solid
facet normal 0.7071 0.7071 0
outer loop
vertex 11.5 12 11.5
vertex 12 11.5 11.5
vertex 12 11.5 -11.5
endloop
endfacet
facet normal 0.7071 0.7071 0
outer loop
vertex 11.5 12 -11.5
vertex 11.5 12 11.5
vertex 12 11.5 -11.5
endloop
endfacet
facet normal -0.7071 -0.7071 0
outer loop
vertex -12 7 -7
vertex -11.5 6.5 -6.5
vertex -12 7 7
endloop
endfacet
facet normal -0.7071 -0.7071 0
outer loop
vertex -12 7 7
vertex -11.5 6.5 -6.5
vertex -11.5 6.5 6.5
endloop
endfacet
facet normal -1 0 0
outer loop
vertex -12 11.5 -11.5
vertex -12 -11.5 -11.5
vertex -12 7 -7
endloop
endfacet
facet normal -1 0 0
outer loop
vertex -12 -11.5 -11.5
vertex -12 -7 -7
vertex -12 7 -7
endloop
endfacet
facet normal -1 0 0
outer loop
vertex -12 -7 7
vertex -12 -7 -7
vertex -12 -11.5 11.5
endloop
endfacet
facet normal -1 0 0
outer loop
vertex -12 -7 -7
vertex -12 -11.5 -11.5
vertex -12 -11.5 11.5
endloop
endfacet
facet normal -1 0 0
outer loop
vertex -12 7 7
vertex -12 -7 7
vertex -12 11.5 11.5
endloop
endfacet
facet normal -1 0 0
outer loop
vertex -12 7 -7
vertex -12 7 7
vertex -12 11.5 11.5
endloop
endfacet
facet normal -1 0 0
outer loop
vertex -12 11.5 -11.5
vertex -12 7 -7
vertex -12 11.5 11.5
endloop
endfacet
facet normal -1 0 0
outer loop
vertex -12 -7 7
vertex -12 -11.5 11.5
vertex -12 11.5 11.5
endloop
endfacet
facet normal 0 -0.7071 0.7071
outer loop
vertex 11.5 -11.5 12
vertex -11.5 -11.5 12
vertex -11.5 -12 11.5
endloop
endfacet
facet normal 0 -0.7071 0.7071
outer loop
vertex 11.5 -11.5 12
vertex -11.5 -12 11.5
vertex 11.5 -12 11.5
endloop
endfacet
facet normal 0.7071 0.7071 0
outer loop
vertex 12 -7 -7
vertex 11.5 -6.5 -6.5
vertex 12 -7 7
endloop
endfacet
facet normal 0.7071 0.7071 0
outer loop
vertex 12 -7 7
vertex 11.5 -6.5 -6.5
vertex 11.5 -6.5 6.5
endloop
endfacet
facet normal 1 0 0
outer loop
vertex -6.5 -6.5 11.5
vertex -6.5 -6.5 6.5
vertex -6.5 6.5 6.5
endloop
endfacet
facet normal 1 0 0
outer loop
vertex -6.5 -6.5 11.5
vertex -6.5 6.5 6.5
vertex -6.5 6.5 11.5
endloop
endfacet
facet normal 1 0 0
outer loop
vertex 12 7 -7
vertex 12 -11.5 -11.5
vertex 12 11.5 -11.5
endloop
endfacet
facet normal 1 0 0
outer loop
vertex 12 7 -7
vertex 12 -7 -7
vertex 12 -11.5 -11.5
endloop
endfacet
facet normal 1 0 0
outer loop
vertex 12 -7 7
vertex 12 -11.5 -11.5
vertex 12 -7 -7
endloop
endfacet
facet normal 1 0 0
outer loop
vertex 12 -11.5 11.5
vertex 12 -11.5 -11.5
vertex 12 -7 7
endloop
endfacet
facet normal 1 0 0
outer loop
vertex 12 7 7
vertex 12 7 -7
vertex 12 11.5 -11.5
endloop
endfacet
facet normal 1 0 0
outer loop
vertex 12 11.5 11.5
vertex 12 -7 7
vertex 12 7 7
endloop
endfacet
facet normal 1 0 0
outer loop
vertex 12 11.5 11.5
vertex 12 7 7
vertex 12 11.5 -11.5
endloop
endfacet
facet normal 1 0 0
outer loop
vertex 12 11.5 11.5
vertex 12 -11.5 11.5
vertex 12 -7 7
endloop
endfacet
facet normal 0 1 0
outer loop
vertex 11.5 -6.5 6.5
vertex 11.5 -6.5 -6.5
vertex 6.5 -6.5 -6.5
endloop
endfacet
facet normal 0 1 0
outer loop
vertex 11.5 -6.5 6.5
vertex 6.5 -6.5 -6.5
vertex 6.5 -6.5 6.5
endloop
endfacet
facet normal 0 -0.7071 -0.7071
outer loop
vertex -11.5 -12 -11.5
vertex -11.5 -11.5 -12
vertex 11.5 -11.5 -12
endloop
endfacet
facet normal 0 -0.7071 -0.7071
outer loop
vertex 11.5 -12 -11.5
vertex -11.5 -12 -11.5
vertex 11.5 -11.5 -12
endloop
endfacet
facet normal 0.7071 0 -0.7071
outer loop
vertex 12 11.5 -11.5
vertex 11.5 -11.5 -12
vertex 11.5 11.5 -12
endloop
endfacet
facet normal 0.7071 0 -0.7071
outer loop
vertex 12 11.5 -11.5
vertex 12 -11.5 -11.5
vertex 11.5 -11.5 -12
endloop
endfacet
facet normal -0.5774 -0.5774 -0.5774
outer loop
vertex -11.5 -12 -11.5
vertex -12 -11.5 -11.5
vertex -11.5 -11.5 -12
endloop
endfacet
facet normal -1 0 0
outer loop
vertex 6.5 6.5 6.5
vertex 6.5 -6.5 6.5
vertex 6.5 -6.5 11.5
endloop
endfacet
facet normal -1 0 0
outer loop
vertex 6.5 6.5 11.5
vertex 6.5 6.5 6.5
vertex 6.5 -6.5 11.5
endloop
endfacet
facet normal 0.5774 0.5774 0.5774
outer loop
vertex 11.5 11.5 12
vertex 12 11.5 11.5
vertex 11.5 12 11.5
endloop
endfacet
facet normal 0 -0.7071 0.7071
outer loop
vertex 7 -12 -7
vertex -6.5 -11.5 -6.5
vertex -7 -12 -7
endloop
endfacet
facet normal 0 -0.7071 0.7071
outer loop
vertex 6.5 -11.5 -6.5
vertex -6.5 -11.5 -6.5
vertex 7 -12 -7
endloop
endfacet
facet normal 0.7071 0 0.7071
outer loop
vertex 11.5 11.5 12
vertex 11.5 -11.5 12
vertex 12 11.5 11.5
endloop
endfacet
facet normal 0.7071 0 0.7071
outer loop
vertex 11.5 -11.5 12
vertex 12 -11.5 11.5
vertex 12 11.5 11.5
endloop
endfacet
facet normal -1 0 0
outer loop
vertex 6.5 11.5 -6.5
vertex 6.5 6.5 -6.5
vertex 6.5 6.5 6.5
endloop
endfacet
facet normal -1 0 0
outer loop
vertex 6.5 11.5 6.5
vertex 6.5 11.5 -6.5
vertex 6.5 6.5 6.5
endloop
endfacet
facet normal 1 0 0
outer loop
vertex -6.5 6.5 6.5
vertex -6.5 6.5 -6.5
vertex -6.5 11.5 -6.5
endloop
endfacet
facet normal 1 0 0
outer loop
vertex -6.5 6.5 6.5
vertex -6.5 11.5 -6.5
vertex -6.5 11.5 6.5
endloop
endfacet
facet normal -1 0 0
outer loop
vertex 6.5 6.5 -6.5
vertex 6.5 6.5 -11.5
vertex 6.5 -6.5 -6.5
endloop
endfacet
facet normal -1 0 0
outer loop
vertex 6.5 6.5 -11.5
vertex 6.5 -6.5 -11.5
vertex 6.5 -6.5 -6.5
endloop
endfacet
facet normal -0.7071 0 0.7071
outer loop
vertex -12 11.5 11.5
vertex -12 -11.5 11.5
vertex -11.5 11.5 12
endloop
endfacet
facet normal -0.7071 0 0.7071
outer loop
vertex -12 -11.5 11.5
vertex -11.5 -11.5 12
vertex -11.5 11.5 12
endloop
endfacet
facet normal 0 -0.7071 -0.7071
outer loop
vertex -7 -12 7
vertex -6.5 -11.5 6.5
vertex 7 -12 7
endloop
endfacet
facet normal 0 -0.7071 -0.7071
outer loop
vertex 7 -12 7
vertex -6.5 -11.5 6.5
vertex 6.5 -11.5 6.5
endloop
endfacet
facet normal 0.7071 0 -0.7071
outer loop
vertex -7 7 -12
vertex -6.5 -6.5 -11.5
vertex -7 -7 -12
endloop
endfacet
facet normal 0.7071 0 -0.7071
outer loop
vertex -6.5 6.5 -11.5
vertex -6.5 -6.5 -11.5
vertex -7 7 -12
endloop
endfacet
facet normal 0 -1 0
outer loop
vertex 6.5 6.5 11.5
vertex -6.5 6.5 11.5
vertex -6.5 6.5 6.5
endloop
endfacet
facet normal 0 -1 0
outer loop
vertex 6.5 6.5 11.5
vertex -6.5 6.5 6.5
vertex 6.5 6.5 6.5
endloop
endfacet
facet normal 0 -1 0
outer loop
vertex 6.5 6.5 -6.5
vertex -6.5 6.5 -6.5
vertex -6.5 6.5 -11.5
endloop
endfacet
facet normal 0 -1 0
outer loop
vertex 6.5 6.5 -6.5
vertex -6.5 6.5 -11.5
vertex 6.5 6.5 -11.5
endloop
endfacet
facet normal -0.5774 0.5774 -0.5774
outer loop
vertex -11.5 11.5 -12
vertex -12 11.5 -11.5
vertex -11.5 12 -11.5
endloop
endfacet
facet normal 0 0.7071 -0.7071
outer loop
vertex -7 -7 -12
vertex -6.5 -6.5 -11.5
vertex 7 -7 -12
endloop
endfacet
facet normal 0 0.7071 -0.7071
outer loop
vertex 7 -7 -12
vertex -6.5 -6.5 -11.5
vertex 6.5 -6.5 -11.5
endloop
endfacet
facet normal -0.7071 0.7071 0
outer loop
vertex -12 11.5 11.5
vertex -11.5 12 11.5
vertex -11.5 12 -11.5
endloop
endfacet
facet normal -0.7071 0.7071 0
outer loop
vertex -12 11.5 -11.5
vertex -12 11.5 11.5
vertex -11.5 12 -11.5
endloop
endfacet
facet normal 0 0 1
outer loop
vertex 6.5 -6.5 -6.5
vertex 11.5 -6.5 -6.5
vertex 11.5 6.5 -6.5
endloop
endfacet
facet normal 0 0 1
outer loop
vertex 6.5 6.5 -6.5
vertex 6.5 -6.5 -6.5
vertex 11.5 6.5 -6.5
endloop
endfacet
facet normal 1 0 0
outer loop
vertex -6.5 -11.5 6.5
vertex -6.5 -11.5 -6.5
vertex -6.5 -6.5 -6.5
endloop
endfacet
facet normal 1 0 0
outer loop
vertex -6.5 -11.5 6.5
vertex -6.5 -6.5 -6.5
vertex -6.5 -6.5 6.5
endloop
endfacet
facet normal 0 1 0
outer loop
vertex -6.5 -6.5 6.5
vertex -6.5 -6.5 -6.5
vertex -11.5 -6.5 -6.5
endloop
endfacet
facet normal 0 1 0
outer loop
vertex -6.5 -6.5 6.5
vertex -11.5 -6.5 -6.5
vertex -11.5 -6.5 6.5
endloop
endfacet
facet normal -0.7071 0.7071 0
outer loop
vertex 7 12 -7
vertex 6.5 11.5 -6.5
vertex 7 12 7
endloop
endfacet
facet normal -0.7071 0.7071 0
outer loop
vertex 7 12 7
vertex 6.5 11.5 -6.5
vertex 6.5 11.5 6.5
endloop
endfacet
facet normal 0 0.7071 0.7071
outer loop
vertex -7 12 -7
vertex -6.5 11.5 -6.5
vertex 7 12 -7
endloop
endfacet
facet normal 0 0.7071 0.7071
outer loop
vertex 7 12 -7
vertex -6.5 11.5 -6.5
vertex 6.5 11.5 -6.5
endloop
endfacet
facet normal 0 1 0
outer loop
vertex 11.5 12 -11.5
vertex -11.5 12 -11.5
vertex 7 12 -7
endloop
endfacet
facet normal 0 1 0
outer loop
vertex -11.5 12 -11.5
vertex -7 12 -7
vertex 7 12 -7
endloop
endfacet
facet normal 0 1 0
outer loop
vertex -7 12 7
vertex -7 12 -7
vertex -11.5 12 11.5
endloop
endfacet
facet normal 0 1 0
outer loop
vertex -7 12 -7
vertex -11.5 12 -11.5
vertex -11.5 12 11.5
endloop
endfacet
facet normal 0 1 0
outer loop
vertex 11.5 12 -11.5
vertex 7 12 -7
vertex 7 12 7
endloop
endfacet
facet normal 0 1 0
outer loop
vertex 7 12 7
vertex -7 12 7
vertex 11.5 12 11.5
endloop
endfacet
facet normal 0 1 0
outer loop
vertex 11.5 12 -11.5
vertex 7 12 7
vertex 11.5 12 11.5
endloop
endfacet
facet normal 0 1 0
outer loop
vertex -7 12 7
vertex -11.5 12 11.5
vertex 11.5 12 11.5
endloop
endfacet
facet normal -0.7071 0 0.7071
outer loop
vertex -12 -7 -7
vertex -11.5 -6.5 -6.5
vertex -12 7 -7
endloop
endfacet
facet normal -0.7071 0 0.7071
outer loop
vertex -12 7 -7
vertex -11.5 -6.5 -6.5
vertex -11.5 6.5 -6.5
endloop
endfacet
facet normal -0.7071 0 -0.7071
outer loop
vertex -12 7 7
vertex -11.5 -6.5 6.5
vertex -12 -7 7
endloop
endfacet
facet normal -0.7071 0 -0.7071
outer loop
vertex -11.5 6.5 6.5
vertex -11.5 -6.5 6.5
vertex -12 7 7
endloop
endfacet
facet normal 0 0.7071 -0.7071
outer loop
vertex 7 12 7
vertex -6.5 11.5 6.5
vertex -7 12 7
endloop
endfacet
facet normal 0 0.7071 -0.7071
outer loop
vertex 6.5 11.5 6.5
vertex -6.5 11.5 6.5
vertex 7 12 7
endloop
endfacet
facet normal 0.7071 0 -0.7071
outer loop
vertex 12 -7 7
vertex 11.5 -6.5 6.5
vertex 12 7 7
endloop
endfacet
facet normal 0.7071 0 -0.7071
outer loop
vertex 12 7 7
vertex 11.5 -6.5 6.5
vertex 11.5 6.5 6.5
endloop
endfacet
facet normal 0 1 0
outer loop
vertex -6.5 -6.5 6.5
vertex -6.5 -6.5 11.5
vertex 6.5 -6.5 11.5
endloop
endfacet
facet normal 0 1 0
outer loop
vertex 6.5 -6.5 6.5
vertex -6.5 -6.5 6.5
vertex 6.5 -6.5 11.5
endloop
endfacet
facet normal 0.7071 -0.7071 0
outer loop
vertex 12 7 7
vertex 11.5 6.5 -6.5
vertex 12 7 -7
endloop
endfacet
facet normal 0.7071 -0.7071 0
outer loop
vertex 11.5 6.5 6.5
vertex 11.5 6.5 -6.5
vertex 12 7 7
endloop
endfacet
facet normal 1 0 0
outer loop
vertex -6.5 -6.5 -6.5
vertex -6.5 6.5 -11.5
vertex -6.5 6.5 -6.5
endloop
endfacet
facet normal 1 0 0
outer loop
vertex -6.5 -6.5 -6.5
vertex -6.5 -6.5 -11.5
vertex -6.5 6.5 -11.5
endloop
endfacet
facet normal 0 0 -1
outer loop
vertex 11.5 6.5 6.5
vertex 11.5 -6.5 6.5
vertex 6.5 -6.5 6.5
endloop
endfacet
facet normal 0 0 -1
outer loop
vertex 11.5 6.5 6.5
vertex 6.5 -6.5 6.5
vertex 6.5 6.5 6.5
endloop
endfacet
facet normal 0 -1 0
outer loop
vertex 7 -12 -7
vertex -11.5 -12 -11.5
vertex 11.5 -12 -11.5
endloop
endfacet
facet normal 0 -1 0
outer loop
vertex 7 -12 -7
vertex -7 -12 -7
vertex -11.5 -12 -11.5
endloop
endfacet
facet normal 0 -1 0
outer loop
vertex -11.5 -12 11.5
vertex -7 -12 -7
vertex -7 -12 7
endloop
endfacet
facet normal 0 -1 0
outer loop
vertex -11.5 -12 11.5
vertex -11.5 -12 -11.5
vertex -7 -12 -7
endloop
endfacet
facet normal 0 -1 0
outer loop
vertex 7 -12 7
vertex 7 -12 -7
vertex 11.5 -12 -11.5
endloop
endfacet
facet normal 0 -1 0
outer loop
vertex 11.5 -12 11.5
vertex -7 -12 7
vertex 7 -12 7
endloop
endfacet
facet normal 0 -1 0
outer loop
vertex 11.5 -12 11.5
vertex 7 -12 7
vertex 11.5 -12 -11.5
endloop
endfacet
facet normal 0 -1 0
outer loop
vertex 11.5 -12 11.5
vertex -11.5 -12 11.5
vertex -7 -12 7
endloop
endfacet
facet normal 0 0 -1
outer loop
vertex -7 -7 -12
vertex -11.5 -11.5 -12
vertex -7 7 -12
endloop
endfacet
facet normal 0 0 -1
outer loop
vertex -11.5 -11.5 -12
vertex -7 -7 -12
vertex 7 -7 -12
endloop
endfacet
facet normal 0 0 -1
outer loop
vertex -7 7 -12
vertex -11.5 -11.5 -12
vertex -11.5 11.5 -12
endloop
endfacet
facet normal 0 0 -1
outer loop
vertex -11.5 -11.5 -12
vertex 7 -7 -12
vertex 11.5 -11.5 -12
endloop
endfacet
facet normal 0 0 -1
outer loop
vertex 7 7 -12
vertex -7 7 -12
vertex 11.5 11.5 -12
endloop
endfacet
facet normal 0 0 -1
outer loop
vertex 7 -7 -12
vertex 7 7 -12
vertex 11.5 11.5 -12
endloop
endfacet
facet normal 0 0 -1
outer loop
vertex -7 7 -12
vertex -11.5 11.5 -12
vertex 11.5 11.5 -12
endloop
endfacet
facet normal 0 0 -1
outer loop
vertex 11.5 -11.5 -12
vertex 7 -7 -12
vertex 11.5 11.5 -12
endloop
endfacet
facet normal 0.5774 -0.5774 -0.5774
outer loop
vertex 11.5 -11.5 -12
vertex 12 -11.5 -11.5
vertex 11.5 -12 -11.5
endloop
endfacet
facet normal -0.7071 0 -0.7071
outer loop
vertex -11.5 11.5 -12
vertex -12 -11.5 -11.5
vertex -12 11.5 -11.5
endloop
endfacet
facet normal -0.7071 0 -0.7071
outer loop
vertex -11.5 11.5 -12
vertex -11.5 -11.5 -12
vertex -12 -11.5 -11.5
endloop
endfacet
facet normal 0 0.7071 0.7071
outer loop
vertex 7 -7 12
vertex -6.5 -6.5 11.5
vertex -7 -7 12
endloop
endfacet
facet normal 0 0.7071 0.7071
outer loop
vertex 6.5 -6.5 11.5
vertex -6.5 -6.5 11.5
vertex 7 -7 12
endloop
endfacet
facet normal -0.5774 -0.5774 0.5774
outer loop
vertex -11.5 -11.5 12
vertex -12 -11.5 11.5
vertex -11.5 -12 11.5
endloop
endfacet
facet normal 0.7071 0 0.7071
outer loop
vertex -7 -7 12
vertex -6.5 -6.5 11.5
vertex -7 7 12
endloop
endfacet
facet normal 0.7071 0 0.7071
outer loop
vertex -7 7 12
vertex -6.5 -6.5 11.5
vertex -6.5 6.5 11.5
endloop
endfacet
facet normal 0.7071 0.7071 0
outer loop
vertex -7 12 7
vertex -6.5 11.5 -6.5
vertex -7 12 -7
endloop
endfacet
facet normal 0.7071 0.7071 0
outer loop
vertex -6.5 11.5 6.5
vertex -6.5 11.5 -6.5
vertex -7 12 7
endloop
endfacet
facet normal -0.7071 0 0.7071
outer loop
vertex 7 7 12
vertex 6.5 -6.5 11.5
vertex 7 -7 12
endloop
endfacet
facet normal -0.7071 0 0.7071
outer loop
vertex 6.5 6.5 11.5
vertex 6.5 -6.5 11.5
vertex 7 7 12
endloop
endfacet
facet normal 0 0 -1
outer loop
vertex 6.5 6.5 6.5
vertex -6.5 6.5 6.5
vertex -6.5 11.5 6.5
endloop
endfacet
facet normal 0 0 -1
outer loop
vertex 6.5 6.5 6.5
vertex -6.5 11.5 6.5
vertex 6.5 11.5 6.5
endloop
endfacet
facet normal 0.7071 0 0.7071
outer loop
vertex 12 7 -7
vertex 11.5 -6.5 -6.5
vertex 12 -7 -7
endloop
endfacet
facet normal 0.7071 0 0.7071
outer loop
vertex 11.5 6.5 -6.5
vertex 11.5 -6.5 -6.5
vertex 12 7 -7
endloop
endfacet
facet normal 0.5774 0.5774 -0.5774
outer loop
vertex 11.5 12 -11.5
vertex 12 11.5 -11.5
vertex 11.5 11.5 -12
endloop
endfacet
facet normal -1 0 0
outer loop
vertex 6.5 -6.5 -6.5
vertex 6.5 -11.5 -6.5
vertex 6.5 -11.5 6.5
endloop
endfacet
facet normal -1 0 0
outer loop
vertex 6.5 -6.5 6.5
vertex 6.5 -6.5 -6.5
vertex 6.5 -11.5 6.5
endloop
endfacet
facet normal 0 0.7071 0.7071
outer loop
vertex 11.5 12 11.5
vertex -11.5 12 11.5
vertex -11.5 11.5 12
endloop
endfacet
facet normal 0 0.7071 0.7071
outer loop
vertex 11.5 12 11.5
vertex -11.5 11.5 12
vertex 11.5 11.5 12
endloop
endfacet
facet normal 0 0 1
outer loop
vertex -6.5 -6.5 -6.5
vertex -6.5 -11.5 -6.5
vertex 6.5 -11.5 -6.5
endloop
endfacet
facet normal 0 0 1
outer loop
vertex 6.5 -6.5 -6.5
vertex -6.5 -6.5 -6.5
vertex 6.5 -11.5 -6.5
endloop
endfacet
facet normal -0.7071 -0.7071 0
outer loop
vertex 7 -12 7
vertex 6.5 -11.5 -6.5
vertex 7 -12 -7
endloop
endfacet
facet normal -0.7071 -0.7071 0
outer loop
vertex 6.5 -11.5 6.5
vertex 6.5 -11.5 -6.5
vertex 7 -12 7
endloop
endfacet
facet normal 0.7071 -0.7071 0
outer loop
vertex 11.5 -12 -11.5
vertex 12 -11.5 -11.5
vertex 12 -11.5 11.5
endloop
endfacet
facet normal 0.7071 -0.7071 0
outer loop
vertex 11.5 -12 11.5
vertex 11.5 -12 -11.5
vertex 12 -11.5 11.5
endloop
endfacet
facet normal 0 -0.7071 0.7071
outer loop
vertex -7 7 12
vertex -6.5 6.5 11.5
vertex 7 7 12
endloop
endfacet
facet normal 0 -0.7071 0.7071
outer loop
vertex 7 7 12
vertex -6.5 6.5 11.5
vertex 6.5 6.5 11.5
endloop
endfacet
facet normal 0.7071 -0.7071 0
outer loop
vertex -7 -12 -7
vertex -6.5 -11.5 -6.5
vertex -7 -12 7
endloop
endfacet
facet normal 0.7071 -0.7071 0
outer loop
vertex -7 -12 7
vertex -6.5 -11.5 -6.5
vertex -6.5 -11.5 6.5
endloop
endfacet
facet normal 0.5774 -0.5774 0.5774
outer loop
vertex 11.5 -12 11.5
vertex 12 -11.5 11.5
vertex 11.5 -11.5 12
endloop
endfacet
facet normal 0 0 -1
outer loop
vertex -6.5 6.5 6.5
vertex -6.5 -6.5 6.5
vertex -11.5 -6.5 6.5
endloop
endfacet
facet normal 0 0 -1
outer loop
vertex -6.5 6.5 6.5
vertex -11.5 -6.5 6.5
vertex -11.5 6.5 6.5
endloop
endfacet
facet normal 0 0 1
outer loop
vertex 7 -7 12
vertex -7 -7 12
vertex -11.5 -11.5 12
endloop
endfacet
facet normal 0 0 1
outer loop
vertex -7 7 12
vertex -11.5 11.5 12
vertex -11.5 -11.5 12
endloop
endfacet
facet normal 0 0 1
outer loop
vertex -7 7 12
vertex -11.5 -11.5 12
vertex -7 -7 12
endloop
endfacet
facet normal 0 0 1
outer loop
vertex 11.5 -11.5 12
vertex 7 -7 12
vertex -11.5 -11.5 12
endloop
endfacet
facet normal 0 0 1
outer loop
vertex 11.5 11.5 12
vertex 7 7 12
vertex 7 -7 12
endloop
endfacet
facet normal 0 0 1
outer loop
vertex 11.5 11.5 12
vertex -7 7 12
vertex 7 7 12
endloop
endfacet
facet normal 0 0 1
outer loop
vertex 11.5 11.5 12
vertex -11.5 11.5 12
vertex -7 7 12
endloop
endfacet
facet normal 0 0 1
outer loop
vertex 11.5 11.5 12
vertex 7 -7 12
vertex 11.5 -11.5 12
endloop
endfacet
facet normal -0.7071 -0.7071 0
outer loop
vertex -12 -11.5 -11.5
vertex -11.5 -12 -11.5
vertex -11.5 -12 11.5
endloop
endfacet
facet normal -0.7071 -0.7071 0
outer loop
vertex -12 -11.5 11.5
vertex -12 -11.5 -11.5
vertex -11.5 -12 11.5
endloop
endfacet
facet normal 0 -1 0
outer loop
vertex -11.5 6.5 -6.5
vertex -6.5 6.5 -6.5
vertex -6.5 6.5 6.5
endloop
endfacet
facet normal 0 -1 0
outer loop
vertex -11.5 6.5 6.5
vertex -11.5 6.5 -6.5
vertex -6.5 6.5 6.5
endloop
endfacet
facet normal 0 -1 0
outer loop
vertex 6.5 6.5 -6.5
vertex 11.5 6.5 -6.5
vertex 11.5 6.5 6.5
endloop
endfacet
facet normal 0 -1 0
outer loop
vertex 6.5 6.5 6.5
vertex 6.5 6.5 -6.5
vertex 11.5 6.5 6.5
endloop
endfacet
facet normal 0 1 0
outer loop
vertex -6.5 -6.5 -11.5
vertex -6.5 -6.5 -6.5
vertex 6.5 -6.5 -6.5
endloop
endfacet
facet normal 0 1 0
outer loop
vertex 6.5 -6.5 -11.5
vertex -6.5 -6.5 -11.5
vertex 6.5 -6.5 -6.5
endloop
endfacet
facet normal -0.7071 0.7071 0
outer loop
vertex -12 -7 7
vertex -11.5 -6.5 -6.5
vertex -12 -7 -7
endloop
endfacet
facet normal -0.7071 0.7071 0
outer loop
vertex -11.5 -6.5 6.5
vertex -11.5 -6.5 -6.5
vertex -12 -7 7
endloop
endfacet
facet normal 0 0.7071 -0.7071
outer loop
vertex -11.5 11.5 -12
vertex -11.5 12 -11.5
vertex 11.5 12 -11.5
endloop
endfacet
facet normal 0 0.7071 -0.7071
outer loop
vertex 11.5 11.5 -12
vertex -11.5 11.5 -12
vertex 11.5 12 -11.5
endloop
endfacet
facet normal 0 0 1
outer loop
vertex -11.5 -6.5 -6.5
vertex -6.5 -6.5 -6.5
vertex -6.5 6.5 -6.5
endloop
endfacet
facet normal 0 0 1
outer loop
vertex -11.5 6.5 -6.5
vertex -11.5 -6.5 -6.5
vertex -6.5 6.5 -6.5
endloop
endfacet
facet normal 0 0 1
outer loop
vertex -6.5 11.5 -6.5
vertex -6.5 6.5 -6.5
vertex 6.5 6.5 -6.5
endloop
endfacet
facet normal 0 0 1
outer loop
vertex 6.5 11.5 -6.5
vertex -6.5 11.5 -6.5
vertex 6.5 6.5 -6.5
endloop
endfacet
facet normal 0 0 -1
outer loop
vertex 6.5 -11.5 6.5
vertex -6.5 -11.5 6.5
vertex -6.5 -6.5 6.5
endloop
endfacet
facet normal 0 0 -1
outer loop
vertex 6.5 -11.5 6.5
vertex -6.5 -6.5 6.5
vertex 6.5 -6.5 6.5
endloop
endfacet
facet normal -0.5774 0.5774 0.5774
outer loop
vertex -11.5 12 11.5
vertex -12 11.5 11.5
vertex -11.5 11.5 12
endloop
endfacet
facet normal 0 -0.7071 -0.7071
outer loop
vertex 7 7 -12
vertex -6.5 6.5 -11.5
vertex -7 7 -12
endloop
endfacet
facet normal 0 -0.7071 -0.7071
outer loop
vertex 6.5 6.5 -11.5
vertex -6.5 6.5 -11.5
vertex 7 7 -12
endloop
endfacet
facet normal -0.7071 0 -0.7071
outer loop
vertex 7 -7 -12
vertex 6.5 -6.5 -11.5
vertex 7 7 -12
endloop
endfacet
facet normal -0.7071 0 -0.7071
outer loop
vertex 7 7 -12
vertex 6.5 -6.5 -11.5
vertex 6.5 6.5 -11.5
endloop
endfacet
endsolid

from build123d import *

# Parameters (mm, degrees)
F0_W          = 24
F0_H          = 24
F0_W_2        = 13
F0_H_2        = 13
F1_DEPTH      = 12
F1_DEPTH_BACK = 12
F2_W          = 13
F2_H          = 13
F3_DEPTH      = 24.001
F4_W          = 13
F4_H          = 13
F5_DEPTH      = 24.001
F6_SIZE       = 0.5


with BuildPart() as f1:
    # F0 (on Top) → F1 (new body, two sides)
    with BuildSketch(Plane.XY) as f1_sk:
        Rectangle(F0_W, F0_H)
        Rectangle(F0_W_2, F0_H_2, mode=Mode.SUBTRACT)
    extrude(amount=F1_DEPTH)
    extrude(f1_sk.sketch, amount=-F1_DEPTH_BACK)

    # F2 (on face) → F3 (cut, through all)
    with BuildSketch(Plane.XZ.offset(12)):
        Rectangle(F2_W, F2_H)
    extrude(amount=-F3_DEPTH, mode=Mode.SUBTRACT)

    # F4 (on face) → F5 (cut, through all)
    with BuildSketch(Plane.YZ.offset(12)):
        Rectangle(F4_W, F4_H)
    extrude(amount=-F5_DEPTH, mode=Mode.SUBTRACT)

    # F6
    f6_edges = [f1.edges().sort_by_distance(p)[0] for p in [
        (-12, 0, 12),
        (-12, 12, 0),
        (-12, 0, -12),
        (-12, -12, 0),
        (12, 0, 12),
        (12, 12, 0),
        (12, 0, -12),
        (12, -12, 0),
        (0, 12, -12),
        (0, 12, 12),
        (0, -12, -12),
        (0, -12, 12),
        (6.5, 0, 12),
        (0, 6.5, 12),
        (-6.5, 0, 12),
        (0, -6.5, 12),
        (6.5, -12, 0),
        (0, -12, 6.5),
        (-6.5, -12, 0),
        (0, -12, -6.5),
        (12, -6.5, 0),
        (12, 0, 6.5),
        (12, 6.5, 0),
        (12, 0, -6.5),
        (6.5, 12, 0),
        (0, 12, 6.5),
        (-6.5, 12, 0),
        (0, 12, -6.5),
        (0, 6.5, -12),
        (6.5, 0, -12),
        (0, -6.5, -12),
        (-6.5, 0, -12),
        (-12, 0, -6.5),
        (-12, 6.5, 0),
        (-12, 0, 6.5),
        (-12, -6.5, 0),
    ]]
    chamfer(f6_edges, length=F6_SIZE)


solid = f1.part
